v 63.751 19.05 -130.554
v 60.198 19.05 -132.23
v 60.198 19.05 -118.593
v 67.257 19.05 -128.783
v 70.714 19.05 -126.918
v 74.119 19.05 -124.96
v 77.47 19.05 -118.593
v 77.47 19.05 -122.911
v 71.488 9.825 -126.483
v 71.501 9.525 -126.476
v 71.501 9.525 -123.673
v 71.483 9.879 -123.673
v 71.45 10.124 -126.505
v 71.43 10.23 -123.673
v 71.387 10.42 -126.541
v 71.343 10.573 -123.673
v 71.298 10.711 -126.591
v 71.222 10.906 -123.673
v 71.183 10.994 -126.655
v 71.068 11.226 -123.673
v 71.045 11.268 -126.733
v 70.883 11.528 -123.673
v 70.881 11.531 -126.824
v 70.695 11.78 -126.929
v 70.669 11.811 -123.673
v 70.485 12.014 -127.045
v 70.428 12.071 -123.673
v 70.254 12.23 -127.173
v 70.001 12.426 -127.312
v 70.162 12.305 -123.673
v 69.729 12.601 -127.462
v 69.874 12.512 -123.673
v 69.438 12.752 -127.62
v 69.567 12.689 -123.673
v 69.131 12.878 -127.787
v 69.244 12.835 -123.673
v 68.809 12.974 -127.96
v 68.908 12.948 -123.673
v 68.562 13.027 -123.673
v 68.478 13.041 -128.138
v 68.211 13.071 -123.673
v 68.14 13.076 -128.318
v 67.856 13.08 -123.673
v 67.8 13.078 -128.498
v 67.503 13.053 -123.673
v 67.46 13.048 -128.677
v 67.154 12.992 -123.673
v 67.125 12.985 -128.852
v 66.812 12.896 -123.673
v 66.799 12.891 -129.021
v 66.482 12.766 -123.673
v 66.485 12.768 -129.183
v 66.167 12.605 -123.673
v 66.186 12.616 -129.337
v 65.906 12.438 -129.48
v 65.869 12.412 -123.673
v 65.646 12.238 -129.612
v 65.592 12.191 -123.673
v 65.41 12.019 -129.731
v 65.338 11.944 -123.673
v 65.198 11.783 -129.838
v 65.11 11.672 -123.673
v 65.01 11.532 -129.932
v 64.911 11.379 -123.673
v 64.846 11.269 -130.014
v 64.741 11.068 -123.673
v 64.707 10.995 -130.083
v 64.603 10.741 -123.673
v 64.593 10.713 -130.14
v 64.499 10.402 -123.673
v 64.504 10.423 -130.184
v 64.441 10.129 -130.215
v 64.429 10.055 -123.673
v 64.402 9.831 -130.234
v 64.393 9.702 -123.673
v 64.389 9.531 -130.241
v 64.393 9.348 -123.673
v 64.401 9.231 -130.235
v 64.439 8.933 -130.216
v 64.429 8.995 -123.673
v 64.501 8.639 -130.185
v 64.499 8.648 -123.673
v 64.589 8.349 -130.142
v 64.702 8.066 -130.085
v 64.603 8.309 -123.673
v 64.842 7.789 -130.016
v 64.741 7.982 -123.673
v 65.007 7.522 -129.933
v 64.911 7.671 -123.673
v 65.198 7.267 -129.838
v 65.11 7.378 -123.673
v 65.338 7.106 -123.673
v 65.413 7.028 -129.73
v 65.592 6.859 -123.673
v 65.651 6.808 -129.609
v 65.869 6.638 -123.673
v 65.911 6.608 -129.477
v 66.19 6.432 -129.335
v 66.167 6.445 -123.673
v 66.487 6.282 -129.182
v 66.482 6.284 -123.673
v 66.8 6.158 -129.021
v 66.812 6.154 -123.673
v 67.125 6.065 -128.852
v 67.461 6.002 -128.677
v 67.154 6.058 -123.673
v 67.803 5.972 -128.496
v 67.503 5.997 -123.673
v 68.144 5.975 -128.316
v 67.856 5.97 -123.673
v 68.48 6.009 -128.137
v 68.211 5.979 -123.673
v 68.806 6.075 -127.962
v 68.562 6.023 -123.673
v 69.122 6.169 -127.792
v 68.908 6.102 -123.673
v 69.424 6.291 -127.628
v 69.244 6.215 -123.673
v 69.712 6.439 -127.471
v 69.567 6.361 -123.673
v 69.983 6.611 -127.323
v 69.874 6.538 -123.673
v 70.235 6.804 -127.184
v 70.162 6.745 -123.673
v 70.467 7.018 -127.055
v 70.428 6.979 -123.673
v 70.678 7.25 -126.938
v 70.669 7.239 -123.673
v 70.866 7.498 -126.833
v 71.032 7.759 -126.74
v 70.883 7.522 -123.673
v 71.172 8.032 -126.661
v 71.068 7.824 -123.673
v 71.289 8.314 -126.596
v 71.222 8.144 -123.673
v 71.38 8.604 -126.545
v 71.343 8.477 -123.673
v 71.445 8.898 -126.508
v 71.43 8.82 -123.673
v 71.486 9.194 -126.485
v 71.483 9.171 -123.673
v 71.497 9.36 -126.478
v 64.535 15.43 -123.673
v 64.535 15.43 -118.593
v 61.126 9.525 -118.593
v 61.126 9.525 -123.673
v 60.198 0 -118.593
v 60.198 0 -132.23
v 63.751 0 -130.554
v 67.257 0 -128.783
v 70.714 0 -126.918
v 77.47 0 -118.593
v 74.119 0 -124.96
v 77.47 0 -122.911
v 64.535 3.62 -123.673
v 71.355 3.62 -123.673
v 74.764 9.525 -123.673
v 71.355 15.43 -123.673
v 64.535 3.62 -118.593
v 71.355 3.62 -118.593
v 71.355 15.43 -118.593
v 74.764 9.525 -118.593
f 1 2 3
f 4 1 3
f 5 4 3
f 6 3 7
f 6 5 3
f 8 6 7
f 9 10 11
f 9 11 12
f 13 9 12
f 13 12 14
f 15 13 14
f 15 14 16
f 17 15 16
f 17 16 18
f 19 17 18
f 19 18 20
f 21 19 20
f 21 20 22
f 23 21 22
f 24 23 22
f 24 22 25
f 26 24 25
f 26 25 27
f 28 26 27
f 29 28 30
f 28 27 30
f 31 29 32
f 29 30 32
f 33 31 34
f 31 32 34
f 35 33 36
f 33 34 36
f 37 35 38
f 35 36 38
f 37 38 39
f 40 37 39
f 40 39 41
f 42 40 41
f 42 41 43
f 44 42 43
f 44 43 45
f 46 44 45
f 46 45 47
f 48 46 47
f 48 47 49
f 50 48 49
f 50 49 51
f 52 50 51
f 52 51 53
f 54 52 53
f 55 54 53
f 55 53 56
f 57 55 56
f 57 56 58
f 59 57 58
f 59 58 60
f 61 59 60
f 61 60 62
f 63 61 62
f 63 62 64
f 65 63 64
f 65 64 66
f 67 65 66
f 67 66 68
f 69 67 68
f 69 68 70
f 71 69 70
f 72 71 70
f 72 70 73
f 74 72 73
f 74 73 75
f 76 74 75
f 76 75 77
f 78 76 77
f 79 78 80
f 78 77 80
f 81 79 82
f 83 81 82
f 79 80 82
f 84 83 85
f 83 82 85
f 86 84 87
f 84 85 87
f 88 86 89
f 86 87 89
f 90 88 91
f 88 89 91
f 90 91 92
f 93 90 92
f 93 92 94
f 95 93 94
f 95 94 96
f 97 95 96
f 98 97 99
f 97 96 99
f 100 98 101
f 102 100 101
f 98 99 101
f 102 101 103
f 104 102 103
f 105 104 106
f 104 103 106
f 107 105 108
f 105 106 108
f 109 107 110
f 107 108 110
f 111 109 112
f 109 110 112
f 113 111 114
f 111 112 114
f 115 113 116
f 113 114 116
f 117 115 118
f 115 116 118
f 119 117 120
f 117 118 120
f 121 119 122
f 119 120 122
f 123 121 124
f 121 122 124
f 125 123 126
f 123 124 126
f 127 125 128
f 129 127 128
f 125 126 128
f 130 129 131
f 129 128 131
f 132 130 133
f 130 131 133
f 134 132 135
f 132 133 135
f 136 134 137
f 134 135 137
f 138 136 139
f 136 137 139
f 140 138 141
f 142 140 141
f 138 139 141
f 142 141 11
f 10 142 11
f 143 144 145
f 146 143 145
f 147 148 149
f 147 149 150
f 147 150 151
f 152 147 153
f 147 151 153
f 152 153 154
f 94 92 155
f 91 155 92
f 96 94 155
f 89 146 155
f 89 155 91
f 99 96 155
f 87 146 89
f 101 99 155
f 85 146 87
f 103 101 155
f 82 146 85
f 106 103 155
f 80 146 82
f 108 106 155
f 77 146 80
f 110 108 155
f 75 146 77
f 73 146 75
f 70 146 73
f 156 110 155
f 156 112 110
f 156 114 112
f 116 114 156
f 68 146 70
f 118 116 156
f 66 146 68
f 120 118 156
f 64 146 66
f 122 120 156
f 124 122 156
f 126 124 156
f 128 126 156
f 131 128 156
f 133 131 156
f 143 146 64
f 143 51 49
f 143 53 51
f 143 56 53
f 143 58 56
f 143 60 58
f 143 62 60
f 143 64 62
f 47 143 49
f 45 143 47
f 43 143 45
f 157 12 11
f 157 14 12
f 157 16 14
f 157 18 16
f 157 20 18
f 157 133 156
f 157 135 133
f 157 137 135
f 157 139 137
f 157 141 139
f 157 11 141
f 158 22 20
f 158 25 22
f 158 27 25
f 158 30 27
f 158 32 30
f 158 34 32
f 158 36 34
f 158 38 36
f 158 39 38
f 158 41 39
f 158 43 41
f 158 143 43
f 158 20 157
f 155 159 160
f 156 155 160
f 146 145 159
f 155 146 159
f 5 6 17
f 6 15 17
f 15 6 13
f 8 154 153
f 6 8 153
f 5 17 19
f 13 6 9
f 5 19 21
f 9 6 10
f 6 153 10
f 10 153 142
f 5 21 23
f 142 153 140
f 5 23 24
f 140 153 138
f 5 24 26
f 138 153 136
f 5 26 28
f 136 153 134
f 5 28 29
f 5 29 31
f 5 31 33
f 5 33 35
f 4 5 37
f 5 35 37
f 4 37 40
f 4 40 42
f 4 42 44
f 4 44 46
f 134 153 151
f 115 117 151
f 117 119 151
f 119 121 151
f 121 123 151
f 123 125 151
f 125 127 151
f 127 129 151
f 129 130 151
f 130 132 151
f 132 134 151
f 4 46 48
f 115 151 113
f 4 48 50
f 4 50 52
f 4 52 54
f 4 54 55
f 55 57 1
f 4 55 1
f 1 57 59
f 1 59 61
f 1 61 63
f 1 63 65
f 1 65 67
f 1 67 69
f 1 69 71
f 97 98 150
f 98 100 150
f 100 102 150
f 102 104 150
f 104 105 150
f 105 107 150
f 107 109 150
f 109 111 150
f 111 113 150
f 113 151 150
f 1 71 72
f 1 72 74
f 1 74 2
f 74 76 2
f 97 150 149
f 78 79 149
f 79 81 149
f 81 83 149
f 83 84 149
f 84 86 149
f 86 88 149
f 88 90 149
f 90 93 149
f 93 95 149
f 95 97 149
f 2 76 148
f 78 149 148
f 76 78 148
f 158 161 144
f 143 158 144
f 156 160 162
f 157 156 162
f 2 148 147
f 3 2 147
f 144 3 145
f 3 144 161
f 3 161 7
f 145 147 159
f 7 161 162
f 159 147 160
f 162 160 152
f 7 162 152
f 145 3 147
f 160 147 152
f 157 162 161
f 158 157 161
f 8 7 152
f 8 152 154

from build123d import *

# Parameters (mm, degrees)
BOSS_EXTRUDE1_DEPTH     = 19.05
CUT_EXTRUDE1_DEPTH      = 5.08
CUT_EXTRUDE2_REACH      = 82.935
CUT_EXTRUDE2_END_RADIUS = 145.288
SKETCH2_3_R             = 3.556


with BuildPart() as part:
    # Sketch1 → Boss-Extrude1 (new body)
    with BuildSketch(Plane(origin=(0, 0, 0), x_dir=(1, 0, 0), z_dir=(0, 1, 0))):
        with BuildLine():
            ThreePointArc((77.47, 122.910544885), (68.991544122, 127.862307909), (60.198, 132.230116615))
            Line((60.198, 132.230116615), (60.198, 118.592544885))
            Line((60.198, 118.592544885), (77.47, 118.592544885))
            Line((77.47, 118.592544885), (77.47, 122.910544885))
        make_face()
    extrude(amount=BOSS_EXTRUDE1_DEPTH)

    # Sketch2 → Cut-Extrude1 (cut)
    with BuildSketch(Plane.XY.offset(-118.592544885)):
        Polygon((71.354542015, 3.6195), (74.764084029, 9.525), (71.354542015, 15.4305), (64.535457985, 15.4305), (61.125915971, 9.525), (64.535457985, 3.6195), align=None)
    extrude(amount=-CUT_EXTRUDE1_DEPTH, mode=Mode.SUBTRACT)

    # Cut-Extrude2: up to this cylinder (the profile starts inside it)
    cut_extrude2_end = Plane(origin=(0, 9.525, 0), z_dir=(0, -1, 0)) * Cylinder(CUT_EXTRUDE2_END_RADIUS, 457.446, mode=Mode.PRIVATE)
    # Sketch2<3> → Cut-Extrude2 (cut, up to the surface)
    with BuildSketch(Plane.XY.offset(-118.592544885), mode=Mode.PRIVATE) as cut_extrude2_sk1:
        with Locations((67.945, 9.525)):
            Circle(SKETCH2_3_R)
    cut_extrude2_tool1 = extrude(cut_extrude2_sk1.sketch, amount=-CUT_EXTRUDE2_REACH, mode=Mode.PRIVATE) & cut_extrude2_end
    add(cut_extrude2_tool1.solids().sort_by_distance((67.945, 9.525, -118.592545))[0], mode=Mode.SUBTRACT)


solid = part.part
